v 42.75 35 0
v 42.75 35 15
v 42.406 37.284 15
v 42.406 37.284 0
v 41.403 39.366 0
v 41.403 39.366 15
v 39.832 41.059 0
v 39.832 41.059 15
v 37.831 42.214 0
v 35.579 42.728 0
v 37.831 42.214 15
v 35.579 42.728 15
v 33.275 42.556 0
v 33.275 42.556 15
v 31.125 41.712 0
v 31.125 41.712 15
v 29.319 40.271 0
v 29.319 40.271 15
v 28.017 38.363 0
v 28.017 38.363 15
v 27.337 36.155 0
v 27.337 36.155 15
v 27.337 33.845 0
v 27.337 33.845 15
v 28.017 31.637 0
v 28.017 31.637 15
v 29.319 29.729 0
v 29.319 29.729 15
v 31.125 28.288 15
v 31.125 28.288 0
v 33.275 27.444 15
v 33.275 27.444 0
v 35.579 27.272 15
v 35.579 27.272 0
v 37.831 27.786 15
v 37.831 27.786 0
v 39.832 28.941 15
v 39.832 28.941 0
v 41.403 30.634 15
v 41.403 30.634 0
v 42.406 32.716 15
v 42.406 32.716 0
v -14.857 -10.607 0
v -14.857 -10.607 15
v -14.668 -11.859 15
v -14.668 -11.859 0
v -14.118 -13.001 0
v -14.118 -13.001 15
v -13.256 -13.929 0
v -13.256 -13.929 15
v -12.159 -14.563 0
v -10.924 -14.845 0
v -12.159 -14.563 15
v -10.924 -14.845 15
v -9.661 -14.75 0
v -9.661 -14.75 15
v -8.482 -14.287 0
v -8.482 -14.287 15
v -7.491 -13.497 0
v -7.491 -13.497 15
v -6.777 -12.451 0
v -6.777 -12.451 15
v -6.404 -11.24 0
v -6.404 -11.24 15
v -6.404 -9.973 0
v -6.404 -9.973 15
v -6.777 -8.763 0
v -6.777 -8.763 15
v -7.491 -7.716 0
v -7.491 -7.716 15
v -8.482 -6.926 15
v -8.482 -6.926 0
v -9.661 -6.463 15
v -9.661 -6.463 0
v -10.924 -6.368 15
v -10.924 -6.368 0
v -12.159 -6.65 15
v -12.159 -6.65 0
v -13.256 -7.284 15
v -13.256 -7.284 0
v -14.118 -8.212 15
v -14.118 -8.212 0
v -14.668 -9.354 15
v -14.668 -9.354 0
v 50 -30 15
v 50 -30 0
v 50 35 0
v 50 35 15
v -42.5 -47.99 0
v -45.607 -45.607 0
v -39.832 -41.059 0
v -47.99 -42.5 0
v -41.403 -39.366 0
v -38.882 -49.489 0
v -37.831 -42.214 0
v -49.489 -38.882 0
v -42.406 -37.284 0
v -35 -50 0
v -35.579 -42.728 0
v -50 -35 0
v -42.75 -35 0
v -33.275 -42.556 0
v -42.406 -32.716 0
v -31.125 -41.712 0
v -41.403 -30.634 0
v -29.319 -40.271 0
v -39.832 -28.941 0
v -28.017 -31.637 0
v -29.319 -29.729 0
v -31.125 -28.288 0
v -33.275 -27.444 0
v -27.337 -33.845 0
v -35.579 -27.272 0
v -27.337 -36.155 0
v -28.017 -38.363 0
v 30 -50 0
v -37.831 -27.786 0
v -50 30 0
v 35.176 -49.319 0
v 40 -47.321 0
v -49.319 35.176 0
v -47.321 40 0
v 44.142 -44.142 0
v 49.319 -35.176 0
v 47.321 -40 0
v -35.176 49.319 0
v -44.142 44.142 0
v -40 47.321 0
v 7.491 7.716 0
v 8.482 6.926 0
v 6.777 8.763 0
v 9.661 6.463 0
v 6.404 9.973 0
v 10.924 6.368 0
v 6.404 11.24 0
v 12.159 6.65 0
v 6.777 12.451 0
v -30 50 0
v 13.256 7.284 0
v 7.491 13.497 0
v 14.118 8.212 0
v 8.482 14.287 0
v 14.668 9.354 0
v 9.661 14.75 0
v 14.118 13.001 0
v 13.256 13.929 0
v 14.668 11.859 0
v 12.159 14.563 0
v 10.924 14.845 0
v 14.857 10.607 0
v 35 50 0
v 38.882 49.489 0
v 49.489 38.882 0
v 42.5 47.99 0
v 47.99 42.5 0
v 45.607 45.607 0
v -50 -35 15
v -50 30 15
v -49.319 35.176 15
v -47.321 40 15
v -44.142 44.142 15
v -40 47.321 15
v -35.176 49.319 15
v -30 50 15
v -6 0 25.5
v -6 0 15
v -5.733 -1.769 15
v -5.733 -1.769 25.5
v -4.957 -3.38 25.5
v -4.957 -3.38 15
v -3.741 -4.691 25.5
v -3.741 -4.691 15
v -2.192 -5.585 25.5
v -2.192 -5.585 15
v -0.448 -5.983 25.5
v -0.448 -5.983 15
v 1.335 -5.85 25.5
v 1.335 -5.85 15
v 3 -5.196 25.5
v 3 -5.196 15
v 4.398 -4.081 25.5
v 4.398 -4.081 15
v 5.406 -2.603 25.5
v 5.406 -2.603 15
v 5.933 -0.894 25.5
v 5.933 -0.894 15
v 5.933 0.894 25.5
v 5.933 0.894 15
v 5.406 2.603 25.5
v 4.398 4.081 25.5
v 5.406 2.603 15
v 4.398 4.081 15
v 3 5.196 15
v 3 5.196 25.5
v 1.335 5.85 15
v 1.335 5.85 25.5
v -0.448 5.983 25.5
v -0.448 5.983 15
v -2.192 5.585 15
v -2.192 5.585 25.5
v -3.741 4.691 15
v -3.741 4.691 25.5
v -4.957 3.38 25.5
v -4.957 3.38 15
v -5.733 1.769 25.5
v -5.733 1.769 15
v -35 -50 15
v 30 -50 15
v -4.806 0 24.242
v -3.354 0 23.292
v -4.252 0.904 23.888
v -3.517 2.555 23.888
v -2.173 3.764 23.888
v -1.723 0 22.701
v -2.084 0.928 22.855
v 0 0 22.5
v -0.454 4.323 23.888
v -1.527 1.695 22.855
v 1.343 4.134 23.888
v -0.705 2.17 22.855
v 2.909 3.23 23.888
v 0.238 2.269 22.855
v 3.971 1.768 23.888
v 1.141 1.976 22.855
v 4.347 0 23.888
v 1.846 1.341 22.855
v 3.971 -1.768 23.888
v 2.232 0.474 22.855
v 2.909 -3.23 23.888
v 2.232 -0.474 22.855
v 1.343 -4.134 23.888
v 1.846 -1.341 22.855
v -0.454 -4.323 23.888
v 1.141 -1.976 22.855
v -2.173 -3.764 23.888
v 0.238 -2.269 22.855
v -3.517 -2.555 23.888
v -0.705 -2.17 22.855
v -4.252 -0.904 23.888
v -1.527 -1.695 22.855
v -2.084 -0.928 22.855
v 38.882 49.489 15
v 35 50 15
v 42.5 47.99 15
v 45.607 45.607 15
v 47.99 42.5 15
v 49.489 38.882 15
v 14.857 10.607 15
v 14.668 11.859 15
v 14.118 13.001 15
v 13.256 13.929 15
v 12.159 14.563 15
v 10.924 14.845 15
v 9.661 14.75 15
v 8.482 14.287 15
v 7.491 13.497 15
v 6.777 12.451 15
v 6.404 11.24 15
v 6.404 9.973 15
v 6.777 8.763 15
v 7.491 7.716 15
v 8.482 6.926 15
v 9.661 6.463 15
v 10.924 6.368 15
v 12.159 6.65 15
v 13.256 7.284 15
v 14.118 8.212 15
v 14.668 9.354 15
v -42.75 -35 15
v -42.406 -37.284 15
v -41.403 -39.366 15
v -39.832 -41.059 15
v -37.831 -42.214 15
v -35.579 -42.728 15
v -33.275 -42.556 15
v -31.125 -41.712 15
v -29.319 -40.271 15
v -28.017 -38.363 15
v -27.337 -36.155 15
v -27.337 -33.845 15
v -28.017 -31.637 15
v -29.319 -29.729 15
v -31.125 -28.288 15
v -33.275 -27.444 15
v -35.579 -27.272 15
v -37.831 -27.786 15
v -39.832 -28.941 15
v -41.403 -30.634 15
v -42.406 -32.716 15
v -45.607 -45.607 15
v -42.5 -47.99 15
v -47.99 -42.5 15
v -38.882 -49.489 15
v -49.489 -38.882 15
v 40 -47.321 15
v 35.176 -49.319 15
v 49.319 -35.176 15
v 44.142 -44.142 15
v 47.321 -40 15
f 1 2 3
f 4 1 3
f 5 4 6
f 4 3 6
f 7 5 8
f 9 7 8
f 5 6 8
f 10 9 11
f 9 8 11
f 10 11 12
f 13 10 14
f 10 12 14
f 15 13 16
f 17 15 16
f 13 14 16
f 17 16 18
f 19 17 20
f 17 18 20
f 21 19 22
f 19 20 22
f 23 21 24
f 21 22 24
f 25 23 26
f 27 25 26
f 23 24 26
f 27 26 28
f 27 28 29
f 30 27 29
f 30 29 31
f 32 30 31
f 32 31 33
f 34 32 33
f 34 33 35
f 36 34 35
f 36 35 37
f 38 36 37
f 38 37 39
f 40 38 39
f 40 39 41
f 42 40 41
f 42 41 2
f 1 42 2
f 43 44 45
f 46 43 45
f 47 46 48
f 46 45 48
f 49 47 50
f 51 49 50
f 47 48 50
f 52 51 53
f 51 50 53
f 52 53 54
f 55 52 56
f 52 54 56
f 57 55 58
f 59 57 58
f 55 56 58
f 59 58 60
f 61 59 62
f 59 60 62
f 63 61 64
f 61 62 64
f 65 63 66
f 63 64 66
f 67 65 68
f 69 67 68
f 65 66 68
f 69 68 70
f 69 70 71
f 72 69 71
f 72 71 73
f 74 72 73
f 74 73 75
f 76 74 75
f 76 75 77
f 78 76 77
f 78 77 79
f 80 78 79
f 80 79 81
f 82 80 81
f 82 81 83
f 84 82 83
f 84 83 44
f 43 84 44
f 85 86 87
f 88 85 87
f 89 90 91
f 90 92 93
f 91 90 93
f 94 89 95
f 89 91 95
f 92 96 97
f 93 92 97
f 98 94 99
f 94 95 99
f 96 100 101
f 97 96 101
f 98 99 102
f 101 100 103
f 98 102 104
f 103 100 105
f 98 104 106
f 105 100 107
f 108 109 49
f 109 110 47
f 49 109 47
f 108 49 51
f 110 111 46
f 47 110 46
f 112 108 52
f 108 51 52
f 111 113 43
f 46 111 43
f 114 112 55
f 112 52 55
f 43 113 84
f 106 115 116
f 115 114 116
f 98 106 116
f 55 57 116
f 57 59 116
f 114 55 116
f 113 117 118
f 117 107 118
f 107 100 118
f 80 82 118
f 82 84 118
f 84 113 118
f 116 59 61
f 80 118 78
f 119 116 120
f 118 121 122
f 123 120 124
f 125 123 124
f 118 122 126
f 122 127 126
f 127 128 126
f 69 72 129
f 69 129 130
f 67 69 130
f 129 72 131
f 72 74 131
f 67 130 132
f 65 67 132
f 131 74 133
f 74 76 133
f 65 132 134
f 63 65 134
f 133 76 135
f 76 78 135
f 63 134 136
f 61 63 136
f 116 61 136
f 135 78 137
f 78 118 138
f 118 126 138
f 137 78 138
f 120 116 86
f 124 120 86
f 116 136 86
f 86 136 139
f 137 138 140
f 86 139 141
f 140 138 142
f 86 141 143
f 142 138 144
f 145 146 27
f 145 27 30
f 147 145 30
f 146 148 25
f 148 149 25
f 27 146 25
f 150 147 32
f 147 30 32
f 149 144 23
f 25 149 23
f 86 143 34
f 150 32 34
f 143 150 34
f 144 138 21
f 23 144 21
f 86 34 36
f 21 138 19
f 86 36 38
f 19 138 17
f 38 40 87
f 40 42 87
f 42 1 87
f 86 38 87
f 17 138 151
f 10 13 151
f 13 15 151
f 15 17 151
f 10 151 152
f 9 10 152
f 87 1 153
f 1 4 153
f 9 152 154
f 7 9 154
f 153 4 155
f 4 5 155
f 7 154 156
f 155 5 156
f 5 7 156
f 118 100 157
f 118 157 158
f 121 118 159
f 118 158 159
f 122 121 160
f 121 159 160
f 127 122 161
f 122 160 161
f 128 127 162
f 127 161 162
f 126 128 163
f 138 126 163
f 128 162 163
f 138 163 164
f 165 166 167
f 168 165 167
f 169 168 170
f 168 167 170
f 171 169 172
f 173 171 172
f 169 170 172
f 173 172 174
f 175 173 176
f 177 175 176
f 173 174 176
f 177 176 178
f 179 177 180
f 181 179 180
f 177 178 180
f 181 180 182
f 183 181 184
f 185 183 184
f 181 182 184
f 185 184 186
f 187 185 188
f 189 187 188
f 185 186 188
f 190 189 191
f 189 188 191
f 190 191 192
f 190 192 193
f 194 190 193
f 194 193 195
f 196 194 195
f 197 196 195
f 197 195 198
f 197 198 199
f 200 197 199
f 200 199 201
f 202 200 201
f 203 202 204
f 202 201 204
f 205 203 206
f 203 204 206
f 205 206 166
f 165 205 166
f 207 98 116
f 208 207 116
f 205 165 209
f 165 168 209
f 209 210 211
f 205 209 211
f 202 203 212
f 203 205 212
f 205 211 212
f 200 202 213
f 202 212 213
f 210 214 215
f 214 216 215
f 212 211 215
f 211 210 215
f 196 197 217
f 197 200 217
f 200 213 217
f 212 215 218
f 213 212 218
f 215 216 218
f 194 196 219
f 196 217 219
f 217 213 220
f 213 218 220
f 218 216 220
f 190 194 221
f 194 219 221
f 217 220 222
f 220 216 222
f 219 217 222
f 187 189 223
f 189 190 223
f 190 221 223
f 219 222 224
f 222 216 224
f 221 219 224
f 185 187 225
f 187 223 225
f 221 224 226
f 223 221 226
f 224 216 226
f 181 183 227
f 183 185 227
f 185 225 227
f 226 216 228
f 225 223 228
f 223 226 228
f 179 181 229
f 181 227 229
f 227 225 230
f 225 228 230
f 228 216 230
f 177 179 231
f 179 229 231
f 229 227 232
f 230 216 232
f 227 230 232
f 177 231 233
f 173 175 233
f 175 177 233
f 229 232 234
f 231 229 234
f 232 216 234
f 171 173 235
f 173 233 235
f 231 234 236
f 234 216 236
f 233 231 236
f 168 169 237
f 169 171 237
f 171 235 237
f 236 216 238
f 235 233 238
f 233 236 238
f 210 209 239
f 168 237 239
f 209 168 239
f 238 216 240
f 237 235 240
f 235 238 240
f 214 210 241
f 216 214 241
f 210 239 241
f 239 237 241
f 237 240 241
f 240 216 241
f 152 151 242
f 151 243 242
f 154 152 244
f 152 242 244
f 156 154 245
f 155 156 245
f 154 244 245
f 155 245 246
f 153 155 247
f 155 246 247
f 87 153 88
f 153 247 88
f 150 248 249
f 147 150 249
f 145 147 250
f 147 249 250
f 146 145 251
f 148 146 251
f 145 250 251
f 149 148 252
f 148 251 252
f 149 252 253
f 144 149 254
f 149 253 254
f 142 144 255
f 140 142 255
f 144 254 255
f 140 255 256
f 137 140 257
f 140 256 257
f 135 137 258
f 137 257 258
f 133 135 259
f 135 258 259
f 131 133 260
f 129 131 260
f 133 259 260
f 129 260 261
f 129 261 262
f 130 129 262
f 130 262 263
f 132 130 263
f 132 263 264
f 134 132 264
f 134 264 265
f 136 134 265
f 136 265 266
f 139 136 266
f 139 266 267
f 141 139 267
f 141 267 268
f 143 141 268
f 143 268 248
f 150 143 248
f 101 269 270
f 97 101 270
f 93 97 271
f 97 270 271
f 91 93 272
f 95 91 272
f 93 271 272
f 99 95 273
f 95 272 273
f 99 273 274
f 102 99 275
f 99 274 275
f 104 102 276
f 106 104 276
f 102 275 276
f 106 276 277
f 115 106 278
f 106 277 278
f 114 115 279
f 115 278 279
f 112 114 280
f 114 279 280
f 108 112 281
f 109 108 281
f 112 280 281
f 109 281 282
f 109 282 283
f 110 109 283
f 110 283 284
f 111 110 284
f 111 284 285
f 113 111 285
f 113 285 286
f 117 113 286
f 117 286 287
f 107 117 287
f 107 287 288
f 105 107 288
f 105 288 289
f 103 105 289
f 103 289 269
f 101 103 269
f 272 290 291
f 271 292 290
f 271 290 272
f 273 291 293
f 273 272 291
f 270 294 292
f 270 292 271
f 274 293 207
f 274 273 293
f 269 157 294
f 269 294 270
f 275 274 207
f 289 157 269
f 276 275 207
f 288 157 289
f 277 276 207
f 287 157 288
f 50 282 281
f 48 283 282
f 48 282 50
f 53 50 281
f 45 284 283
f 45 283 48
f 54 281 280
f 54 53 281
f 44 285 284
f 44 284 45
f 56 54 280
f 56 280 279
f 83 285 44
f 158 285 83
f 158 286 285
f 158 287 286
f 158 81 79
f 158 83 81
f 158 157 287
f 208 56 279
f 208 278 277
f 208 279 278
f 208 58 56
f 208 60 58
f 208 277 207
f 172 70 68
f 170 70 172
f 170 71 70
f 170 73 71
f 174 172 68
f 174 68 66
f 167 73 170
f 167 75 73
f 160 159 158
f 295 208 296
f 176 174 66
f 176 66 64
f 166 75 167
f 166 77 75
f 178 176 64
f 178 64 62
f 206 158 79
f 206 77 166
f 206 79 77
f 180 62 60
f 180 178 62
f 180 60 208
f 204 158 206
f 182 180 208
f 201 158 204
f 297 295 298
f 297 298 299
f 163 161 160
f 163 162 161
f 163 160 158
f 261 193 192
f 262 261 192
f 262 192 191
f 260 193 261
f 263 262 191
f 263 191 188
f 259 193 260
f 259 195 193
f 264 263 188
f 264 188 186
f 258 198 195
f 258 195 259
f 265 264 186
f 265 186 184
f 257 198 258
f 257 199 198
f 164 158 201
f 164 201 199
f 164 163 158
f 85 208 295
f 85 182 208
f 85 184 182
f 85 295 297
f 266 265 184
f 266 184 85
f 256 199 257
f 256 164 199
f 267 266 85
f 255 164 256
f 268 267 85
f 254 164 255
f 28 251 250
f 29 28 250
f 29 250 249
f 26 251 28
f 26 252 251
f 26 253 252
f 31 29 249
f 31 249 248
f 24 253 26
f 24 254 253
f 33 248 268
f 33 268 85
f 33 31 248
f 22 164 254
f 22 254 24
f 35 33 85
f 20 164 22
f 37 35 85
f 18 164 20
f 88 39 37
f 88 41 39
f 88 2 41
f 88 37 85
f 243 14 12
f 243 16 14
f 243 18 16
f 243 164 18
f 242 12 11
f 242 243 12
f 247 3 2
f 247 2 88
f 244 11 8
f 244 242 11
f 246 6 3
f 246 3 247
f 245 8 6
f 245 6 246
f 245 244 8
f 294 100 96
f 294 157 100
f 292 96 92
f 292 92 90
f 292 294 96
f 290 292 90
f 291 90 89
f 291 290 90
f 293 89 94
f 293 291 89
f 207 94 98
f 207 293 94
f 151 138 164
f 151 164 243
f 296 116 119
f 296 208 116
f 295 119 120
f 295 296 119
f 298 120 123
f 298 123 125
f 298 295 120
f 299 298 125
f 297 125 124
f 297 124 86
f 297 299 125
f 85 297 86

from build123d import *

# Parameters (mm, degrees)
SKETCH1_W           = 100
SKETCH1_H           = 100
BOSS_EXTRUDE1_DEPTH = 15
SKETCH2_R           = 7.75
CUT_EXTRUDE1_DEPTH  = 73.284161474
SKETCH5_R           = 6
BOSS_EXTRUDE6_DEPTH = 10.5
SKETCH6_R           = 4.25
CUT_EXTRUDE3_DEPTH  = 73.284161474
FILLET1_R           = 20
FILLET2_R           = 15
DOME2_FACE_RADIUS   = 6
DOME2_HEIGHT        = 3


with BuildPart() as part:
    # Sketch1 → Boss-Extrude1 (new body)
    with BuildSketch(Plane.XY):
        Rectangle(SKETCH1_W, SKETCH1_H)
    extrude(amount=BOSS_EXTRUDE1_DEPTH)

    # Sketch2 → Cut-Extrude1 (cut, through all)
    with BuildSketch(Plane.XY.offset(15)):
        with Locations((35, 35)):
            Circle(SKETCH2_R)
        with Locations(Location((-35, -35, 0), (0, 0, 180))):
            Circle(SKETCH2_R)
    extrude(amount=-CUT_EXTRUDE1_DEPTH, mode=Mode.SUBTRACT)

    # Sketch5 → Boss-Extrude6 (add)
    with BuildSketch(Plane.XY.offset(15)):
        with Locations(Location((0, 0, 0), (0, 0, 180))):
            Circle(SKETCH5_R)
    extrude(amount=BOSS_EXTRUDE6_DEPTH)

    # Sketch6 → Cut-Extrude3 (cut, through all)
    with BuildSketch(Plane.XY.offset(15)):
        with Locations((10.606601718, 10.606601718)):
            Circle(SKETCH6_R)
        with Locations(Location((-10.606601718, -10.606601718, 0), (0, 0, 180))):
            Circle(SKETCH6_R)
    extrude(amount=-CUT_EXTRUDE3_DEPTH, mode=Mode.SUBTRACT)

    # Fillet1
    fillet1_edges = [part.edges().sort_by_distance(p)[0] for p in [
        (-50, 50, 7.5),
        (50, -50, 7.5),
    ]]
    fillet(fillet1_edges, radius=FILLET1_R)

    # Fillet2
    fillet2_edges = [part.edges().sort_by_distance(p)[0] for p in [
        (50, 50, 7.5),
        (-50, -50, 7.5),
    ]]
    fillet(fillet2_edges, radius=FILLET2_R)

    # Dome2: a dome of height H over a round flat face of radius A is a cap of a sphere of radius (A * A + H * H) / (2 * H)
    dome2_r = (DOME2_FACE_RADIUS * DOME2_FACE_RADIUS + DOME2_HEIGHT * DOME2_HEIGHT) / (2 * DOME2_HEIGHT)
    dome2_base = Plane((0, 0, 25.5), z_dir=(0, 0, -1))
    with Locations(dome2_base.offset(DOME2_HEIGHT - dome2_r)):
        dome2_ball = Sphere(dome2_r, mode=Mode.PRIVATE)
    add(split(dome2_ball, bisect_by=dome2_base, keep=Keep.TOP, mode=Mode.PRIVATE), mode=Mode.SUBTRACT)


solid = part.part
